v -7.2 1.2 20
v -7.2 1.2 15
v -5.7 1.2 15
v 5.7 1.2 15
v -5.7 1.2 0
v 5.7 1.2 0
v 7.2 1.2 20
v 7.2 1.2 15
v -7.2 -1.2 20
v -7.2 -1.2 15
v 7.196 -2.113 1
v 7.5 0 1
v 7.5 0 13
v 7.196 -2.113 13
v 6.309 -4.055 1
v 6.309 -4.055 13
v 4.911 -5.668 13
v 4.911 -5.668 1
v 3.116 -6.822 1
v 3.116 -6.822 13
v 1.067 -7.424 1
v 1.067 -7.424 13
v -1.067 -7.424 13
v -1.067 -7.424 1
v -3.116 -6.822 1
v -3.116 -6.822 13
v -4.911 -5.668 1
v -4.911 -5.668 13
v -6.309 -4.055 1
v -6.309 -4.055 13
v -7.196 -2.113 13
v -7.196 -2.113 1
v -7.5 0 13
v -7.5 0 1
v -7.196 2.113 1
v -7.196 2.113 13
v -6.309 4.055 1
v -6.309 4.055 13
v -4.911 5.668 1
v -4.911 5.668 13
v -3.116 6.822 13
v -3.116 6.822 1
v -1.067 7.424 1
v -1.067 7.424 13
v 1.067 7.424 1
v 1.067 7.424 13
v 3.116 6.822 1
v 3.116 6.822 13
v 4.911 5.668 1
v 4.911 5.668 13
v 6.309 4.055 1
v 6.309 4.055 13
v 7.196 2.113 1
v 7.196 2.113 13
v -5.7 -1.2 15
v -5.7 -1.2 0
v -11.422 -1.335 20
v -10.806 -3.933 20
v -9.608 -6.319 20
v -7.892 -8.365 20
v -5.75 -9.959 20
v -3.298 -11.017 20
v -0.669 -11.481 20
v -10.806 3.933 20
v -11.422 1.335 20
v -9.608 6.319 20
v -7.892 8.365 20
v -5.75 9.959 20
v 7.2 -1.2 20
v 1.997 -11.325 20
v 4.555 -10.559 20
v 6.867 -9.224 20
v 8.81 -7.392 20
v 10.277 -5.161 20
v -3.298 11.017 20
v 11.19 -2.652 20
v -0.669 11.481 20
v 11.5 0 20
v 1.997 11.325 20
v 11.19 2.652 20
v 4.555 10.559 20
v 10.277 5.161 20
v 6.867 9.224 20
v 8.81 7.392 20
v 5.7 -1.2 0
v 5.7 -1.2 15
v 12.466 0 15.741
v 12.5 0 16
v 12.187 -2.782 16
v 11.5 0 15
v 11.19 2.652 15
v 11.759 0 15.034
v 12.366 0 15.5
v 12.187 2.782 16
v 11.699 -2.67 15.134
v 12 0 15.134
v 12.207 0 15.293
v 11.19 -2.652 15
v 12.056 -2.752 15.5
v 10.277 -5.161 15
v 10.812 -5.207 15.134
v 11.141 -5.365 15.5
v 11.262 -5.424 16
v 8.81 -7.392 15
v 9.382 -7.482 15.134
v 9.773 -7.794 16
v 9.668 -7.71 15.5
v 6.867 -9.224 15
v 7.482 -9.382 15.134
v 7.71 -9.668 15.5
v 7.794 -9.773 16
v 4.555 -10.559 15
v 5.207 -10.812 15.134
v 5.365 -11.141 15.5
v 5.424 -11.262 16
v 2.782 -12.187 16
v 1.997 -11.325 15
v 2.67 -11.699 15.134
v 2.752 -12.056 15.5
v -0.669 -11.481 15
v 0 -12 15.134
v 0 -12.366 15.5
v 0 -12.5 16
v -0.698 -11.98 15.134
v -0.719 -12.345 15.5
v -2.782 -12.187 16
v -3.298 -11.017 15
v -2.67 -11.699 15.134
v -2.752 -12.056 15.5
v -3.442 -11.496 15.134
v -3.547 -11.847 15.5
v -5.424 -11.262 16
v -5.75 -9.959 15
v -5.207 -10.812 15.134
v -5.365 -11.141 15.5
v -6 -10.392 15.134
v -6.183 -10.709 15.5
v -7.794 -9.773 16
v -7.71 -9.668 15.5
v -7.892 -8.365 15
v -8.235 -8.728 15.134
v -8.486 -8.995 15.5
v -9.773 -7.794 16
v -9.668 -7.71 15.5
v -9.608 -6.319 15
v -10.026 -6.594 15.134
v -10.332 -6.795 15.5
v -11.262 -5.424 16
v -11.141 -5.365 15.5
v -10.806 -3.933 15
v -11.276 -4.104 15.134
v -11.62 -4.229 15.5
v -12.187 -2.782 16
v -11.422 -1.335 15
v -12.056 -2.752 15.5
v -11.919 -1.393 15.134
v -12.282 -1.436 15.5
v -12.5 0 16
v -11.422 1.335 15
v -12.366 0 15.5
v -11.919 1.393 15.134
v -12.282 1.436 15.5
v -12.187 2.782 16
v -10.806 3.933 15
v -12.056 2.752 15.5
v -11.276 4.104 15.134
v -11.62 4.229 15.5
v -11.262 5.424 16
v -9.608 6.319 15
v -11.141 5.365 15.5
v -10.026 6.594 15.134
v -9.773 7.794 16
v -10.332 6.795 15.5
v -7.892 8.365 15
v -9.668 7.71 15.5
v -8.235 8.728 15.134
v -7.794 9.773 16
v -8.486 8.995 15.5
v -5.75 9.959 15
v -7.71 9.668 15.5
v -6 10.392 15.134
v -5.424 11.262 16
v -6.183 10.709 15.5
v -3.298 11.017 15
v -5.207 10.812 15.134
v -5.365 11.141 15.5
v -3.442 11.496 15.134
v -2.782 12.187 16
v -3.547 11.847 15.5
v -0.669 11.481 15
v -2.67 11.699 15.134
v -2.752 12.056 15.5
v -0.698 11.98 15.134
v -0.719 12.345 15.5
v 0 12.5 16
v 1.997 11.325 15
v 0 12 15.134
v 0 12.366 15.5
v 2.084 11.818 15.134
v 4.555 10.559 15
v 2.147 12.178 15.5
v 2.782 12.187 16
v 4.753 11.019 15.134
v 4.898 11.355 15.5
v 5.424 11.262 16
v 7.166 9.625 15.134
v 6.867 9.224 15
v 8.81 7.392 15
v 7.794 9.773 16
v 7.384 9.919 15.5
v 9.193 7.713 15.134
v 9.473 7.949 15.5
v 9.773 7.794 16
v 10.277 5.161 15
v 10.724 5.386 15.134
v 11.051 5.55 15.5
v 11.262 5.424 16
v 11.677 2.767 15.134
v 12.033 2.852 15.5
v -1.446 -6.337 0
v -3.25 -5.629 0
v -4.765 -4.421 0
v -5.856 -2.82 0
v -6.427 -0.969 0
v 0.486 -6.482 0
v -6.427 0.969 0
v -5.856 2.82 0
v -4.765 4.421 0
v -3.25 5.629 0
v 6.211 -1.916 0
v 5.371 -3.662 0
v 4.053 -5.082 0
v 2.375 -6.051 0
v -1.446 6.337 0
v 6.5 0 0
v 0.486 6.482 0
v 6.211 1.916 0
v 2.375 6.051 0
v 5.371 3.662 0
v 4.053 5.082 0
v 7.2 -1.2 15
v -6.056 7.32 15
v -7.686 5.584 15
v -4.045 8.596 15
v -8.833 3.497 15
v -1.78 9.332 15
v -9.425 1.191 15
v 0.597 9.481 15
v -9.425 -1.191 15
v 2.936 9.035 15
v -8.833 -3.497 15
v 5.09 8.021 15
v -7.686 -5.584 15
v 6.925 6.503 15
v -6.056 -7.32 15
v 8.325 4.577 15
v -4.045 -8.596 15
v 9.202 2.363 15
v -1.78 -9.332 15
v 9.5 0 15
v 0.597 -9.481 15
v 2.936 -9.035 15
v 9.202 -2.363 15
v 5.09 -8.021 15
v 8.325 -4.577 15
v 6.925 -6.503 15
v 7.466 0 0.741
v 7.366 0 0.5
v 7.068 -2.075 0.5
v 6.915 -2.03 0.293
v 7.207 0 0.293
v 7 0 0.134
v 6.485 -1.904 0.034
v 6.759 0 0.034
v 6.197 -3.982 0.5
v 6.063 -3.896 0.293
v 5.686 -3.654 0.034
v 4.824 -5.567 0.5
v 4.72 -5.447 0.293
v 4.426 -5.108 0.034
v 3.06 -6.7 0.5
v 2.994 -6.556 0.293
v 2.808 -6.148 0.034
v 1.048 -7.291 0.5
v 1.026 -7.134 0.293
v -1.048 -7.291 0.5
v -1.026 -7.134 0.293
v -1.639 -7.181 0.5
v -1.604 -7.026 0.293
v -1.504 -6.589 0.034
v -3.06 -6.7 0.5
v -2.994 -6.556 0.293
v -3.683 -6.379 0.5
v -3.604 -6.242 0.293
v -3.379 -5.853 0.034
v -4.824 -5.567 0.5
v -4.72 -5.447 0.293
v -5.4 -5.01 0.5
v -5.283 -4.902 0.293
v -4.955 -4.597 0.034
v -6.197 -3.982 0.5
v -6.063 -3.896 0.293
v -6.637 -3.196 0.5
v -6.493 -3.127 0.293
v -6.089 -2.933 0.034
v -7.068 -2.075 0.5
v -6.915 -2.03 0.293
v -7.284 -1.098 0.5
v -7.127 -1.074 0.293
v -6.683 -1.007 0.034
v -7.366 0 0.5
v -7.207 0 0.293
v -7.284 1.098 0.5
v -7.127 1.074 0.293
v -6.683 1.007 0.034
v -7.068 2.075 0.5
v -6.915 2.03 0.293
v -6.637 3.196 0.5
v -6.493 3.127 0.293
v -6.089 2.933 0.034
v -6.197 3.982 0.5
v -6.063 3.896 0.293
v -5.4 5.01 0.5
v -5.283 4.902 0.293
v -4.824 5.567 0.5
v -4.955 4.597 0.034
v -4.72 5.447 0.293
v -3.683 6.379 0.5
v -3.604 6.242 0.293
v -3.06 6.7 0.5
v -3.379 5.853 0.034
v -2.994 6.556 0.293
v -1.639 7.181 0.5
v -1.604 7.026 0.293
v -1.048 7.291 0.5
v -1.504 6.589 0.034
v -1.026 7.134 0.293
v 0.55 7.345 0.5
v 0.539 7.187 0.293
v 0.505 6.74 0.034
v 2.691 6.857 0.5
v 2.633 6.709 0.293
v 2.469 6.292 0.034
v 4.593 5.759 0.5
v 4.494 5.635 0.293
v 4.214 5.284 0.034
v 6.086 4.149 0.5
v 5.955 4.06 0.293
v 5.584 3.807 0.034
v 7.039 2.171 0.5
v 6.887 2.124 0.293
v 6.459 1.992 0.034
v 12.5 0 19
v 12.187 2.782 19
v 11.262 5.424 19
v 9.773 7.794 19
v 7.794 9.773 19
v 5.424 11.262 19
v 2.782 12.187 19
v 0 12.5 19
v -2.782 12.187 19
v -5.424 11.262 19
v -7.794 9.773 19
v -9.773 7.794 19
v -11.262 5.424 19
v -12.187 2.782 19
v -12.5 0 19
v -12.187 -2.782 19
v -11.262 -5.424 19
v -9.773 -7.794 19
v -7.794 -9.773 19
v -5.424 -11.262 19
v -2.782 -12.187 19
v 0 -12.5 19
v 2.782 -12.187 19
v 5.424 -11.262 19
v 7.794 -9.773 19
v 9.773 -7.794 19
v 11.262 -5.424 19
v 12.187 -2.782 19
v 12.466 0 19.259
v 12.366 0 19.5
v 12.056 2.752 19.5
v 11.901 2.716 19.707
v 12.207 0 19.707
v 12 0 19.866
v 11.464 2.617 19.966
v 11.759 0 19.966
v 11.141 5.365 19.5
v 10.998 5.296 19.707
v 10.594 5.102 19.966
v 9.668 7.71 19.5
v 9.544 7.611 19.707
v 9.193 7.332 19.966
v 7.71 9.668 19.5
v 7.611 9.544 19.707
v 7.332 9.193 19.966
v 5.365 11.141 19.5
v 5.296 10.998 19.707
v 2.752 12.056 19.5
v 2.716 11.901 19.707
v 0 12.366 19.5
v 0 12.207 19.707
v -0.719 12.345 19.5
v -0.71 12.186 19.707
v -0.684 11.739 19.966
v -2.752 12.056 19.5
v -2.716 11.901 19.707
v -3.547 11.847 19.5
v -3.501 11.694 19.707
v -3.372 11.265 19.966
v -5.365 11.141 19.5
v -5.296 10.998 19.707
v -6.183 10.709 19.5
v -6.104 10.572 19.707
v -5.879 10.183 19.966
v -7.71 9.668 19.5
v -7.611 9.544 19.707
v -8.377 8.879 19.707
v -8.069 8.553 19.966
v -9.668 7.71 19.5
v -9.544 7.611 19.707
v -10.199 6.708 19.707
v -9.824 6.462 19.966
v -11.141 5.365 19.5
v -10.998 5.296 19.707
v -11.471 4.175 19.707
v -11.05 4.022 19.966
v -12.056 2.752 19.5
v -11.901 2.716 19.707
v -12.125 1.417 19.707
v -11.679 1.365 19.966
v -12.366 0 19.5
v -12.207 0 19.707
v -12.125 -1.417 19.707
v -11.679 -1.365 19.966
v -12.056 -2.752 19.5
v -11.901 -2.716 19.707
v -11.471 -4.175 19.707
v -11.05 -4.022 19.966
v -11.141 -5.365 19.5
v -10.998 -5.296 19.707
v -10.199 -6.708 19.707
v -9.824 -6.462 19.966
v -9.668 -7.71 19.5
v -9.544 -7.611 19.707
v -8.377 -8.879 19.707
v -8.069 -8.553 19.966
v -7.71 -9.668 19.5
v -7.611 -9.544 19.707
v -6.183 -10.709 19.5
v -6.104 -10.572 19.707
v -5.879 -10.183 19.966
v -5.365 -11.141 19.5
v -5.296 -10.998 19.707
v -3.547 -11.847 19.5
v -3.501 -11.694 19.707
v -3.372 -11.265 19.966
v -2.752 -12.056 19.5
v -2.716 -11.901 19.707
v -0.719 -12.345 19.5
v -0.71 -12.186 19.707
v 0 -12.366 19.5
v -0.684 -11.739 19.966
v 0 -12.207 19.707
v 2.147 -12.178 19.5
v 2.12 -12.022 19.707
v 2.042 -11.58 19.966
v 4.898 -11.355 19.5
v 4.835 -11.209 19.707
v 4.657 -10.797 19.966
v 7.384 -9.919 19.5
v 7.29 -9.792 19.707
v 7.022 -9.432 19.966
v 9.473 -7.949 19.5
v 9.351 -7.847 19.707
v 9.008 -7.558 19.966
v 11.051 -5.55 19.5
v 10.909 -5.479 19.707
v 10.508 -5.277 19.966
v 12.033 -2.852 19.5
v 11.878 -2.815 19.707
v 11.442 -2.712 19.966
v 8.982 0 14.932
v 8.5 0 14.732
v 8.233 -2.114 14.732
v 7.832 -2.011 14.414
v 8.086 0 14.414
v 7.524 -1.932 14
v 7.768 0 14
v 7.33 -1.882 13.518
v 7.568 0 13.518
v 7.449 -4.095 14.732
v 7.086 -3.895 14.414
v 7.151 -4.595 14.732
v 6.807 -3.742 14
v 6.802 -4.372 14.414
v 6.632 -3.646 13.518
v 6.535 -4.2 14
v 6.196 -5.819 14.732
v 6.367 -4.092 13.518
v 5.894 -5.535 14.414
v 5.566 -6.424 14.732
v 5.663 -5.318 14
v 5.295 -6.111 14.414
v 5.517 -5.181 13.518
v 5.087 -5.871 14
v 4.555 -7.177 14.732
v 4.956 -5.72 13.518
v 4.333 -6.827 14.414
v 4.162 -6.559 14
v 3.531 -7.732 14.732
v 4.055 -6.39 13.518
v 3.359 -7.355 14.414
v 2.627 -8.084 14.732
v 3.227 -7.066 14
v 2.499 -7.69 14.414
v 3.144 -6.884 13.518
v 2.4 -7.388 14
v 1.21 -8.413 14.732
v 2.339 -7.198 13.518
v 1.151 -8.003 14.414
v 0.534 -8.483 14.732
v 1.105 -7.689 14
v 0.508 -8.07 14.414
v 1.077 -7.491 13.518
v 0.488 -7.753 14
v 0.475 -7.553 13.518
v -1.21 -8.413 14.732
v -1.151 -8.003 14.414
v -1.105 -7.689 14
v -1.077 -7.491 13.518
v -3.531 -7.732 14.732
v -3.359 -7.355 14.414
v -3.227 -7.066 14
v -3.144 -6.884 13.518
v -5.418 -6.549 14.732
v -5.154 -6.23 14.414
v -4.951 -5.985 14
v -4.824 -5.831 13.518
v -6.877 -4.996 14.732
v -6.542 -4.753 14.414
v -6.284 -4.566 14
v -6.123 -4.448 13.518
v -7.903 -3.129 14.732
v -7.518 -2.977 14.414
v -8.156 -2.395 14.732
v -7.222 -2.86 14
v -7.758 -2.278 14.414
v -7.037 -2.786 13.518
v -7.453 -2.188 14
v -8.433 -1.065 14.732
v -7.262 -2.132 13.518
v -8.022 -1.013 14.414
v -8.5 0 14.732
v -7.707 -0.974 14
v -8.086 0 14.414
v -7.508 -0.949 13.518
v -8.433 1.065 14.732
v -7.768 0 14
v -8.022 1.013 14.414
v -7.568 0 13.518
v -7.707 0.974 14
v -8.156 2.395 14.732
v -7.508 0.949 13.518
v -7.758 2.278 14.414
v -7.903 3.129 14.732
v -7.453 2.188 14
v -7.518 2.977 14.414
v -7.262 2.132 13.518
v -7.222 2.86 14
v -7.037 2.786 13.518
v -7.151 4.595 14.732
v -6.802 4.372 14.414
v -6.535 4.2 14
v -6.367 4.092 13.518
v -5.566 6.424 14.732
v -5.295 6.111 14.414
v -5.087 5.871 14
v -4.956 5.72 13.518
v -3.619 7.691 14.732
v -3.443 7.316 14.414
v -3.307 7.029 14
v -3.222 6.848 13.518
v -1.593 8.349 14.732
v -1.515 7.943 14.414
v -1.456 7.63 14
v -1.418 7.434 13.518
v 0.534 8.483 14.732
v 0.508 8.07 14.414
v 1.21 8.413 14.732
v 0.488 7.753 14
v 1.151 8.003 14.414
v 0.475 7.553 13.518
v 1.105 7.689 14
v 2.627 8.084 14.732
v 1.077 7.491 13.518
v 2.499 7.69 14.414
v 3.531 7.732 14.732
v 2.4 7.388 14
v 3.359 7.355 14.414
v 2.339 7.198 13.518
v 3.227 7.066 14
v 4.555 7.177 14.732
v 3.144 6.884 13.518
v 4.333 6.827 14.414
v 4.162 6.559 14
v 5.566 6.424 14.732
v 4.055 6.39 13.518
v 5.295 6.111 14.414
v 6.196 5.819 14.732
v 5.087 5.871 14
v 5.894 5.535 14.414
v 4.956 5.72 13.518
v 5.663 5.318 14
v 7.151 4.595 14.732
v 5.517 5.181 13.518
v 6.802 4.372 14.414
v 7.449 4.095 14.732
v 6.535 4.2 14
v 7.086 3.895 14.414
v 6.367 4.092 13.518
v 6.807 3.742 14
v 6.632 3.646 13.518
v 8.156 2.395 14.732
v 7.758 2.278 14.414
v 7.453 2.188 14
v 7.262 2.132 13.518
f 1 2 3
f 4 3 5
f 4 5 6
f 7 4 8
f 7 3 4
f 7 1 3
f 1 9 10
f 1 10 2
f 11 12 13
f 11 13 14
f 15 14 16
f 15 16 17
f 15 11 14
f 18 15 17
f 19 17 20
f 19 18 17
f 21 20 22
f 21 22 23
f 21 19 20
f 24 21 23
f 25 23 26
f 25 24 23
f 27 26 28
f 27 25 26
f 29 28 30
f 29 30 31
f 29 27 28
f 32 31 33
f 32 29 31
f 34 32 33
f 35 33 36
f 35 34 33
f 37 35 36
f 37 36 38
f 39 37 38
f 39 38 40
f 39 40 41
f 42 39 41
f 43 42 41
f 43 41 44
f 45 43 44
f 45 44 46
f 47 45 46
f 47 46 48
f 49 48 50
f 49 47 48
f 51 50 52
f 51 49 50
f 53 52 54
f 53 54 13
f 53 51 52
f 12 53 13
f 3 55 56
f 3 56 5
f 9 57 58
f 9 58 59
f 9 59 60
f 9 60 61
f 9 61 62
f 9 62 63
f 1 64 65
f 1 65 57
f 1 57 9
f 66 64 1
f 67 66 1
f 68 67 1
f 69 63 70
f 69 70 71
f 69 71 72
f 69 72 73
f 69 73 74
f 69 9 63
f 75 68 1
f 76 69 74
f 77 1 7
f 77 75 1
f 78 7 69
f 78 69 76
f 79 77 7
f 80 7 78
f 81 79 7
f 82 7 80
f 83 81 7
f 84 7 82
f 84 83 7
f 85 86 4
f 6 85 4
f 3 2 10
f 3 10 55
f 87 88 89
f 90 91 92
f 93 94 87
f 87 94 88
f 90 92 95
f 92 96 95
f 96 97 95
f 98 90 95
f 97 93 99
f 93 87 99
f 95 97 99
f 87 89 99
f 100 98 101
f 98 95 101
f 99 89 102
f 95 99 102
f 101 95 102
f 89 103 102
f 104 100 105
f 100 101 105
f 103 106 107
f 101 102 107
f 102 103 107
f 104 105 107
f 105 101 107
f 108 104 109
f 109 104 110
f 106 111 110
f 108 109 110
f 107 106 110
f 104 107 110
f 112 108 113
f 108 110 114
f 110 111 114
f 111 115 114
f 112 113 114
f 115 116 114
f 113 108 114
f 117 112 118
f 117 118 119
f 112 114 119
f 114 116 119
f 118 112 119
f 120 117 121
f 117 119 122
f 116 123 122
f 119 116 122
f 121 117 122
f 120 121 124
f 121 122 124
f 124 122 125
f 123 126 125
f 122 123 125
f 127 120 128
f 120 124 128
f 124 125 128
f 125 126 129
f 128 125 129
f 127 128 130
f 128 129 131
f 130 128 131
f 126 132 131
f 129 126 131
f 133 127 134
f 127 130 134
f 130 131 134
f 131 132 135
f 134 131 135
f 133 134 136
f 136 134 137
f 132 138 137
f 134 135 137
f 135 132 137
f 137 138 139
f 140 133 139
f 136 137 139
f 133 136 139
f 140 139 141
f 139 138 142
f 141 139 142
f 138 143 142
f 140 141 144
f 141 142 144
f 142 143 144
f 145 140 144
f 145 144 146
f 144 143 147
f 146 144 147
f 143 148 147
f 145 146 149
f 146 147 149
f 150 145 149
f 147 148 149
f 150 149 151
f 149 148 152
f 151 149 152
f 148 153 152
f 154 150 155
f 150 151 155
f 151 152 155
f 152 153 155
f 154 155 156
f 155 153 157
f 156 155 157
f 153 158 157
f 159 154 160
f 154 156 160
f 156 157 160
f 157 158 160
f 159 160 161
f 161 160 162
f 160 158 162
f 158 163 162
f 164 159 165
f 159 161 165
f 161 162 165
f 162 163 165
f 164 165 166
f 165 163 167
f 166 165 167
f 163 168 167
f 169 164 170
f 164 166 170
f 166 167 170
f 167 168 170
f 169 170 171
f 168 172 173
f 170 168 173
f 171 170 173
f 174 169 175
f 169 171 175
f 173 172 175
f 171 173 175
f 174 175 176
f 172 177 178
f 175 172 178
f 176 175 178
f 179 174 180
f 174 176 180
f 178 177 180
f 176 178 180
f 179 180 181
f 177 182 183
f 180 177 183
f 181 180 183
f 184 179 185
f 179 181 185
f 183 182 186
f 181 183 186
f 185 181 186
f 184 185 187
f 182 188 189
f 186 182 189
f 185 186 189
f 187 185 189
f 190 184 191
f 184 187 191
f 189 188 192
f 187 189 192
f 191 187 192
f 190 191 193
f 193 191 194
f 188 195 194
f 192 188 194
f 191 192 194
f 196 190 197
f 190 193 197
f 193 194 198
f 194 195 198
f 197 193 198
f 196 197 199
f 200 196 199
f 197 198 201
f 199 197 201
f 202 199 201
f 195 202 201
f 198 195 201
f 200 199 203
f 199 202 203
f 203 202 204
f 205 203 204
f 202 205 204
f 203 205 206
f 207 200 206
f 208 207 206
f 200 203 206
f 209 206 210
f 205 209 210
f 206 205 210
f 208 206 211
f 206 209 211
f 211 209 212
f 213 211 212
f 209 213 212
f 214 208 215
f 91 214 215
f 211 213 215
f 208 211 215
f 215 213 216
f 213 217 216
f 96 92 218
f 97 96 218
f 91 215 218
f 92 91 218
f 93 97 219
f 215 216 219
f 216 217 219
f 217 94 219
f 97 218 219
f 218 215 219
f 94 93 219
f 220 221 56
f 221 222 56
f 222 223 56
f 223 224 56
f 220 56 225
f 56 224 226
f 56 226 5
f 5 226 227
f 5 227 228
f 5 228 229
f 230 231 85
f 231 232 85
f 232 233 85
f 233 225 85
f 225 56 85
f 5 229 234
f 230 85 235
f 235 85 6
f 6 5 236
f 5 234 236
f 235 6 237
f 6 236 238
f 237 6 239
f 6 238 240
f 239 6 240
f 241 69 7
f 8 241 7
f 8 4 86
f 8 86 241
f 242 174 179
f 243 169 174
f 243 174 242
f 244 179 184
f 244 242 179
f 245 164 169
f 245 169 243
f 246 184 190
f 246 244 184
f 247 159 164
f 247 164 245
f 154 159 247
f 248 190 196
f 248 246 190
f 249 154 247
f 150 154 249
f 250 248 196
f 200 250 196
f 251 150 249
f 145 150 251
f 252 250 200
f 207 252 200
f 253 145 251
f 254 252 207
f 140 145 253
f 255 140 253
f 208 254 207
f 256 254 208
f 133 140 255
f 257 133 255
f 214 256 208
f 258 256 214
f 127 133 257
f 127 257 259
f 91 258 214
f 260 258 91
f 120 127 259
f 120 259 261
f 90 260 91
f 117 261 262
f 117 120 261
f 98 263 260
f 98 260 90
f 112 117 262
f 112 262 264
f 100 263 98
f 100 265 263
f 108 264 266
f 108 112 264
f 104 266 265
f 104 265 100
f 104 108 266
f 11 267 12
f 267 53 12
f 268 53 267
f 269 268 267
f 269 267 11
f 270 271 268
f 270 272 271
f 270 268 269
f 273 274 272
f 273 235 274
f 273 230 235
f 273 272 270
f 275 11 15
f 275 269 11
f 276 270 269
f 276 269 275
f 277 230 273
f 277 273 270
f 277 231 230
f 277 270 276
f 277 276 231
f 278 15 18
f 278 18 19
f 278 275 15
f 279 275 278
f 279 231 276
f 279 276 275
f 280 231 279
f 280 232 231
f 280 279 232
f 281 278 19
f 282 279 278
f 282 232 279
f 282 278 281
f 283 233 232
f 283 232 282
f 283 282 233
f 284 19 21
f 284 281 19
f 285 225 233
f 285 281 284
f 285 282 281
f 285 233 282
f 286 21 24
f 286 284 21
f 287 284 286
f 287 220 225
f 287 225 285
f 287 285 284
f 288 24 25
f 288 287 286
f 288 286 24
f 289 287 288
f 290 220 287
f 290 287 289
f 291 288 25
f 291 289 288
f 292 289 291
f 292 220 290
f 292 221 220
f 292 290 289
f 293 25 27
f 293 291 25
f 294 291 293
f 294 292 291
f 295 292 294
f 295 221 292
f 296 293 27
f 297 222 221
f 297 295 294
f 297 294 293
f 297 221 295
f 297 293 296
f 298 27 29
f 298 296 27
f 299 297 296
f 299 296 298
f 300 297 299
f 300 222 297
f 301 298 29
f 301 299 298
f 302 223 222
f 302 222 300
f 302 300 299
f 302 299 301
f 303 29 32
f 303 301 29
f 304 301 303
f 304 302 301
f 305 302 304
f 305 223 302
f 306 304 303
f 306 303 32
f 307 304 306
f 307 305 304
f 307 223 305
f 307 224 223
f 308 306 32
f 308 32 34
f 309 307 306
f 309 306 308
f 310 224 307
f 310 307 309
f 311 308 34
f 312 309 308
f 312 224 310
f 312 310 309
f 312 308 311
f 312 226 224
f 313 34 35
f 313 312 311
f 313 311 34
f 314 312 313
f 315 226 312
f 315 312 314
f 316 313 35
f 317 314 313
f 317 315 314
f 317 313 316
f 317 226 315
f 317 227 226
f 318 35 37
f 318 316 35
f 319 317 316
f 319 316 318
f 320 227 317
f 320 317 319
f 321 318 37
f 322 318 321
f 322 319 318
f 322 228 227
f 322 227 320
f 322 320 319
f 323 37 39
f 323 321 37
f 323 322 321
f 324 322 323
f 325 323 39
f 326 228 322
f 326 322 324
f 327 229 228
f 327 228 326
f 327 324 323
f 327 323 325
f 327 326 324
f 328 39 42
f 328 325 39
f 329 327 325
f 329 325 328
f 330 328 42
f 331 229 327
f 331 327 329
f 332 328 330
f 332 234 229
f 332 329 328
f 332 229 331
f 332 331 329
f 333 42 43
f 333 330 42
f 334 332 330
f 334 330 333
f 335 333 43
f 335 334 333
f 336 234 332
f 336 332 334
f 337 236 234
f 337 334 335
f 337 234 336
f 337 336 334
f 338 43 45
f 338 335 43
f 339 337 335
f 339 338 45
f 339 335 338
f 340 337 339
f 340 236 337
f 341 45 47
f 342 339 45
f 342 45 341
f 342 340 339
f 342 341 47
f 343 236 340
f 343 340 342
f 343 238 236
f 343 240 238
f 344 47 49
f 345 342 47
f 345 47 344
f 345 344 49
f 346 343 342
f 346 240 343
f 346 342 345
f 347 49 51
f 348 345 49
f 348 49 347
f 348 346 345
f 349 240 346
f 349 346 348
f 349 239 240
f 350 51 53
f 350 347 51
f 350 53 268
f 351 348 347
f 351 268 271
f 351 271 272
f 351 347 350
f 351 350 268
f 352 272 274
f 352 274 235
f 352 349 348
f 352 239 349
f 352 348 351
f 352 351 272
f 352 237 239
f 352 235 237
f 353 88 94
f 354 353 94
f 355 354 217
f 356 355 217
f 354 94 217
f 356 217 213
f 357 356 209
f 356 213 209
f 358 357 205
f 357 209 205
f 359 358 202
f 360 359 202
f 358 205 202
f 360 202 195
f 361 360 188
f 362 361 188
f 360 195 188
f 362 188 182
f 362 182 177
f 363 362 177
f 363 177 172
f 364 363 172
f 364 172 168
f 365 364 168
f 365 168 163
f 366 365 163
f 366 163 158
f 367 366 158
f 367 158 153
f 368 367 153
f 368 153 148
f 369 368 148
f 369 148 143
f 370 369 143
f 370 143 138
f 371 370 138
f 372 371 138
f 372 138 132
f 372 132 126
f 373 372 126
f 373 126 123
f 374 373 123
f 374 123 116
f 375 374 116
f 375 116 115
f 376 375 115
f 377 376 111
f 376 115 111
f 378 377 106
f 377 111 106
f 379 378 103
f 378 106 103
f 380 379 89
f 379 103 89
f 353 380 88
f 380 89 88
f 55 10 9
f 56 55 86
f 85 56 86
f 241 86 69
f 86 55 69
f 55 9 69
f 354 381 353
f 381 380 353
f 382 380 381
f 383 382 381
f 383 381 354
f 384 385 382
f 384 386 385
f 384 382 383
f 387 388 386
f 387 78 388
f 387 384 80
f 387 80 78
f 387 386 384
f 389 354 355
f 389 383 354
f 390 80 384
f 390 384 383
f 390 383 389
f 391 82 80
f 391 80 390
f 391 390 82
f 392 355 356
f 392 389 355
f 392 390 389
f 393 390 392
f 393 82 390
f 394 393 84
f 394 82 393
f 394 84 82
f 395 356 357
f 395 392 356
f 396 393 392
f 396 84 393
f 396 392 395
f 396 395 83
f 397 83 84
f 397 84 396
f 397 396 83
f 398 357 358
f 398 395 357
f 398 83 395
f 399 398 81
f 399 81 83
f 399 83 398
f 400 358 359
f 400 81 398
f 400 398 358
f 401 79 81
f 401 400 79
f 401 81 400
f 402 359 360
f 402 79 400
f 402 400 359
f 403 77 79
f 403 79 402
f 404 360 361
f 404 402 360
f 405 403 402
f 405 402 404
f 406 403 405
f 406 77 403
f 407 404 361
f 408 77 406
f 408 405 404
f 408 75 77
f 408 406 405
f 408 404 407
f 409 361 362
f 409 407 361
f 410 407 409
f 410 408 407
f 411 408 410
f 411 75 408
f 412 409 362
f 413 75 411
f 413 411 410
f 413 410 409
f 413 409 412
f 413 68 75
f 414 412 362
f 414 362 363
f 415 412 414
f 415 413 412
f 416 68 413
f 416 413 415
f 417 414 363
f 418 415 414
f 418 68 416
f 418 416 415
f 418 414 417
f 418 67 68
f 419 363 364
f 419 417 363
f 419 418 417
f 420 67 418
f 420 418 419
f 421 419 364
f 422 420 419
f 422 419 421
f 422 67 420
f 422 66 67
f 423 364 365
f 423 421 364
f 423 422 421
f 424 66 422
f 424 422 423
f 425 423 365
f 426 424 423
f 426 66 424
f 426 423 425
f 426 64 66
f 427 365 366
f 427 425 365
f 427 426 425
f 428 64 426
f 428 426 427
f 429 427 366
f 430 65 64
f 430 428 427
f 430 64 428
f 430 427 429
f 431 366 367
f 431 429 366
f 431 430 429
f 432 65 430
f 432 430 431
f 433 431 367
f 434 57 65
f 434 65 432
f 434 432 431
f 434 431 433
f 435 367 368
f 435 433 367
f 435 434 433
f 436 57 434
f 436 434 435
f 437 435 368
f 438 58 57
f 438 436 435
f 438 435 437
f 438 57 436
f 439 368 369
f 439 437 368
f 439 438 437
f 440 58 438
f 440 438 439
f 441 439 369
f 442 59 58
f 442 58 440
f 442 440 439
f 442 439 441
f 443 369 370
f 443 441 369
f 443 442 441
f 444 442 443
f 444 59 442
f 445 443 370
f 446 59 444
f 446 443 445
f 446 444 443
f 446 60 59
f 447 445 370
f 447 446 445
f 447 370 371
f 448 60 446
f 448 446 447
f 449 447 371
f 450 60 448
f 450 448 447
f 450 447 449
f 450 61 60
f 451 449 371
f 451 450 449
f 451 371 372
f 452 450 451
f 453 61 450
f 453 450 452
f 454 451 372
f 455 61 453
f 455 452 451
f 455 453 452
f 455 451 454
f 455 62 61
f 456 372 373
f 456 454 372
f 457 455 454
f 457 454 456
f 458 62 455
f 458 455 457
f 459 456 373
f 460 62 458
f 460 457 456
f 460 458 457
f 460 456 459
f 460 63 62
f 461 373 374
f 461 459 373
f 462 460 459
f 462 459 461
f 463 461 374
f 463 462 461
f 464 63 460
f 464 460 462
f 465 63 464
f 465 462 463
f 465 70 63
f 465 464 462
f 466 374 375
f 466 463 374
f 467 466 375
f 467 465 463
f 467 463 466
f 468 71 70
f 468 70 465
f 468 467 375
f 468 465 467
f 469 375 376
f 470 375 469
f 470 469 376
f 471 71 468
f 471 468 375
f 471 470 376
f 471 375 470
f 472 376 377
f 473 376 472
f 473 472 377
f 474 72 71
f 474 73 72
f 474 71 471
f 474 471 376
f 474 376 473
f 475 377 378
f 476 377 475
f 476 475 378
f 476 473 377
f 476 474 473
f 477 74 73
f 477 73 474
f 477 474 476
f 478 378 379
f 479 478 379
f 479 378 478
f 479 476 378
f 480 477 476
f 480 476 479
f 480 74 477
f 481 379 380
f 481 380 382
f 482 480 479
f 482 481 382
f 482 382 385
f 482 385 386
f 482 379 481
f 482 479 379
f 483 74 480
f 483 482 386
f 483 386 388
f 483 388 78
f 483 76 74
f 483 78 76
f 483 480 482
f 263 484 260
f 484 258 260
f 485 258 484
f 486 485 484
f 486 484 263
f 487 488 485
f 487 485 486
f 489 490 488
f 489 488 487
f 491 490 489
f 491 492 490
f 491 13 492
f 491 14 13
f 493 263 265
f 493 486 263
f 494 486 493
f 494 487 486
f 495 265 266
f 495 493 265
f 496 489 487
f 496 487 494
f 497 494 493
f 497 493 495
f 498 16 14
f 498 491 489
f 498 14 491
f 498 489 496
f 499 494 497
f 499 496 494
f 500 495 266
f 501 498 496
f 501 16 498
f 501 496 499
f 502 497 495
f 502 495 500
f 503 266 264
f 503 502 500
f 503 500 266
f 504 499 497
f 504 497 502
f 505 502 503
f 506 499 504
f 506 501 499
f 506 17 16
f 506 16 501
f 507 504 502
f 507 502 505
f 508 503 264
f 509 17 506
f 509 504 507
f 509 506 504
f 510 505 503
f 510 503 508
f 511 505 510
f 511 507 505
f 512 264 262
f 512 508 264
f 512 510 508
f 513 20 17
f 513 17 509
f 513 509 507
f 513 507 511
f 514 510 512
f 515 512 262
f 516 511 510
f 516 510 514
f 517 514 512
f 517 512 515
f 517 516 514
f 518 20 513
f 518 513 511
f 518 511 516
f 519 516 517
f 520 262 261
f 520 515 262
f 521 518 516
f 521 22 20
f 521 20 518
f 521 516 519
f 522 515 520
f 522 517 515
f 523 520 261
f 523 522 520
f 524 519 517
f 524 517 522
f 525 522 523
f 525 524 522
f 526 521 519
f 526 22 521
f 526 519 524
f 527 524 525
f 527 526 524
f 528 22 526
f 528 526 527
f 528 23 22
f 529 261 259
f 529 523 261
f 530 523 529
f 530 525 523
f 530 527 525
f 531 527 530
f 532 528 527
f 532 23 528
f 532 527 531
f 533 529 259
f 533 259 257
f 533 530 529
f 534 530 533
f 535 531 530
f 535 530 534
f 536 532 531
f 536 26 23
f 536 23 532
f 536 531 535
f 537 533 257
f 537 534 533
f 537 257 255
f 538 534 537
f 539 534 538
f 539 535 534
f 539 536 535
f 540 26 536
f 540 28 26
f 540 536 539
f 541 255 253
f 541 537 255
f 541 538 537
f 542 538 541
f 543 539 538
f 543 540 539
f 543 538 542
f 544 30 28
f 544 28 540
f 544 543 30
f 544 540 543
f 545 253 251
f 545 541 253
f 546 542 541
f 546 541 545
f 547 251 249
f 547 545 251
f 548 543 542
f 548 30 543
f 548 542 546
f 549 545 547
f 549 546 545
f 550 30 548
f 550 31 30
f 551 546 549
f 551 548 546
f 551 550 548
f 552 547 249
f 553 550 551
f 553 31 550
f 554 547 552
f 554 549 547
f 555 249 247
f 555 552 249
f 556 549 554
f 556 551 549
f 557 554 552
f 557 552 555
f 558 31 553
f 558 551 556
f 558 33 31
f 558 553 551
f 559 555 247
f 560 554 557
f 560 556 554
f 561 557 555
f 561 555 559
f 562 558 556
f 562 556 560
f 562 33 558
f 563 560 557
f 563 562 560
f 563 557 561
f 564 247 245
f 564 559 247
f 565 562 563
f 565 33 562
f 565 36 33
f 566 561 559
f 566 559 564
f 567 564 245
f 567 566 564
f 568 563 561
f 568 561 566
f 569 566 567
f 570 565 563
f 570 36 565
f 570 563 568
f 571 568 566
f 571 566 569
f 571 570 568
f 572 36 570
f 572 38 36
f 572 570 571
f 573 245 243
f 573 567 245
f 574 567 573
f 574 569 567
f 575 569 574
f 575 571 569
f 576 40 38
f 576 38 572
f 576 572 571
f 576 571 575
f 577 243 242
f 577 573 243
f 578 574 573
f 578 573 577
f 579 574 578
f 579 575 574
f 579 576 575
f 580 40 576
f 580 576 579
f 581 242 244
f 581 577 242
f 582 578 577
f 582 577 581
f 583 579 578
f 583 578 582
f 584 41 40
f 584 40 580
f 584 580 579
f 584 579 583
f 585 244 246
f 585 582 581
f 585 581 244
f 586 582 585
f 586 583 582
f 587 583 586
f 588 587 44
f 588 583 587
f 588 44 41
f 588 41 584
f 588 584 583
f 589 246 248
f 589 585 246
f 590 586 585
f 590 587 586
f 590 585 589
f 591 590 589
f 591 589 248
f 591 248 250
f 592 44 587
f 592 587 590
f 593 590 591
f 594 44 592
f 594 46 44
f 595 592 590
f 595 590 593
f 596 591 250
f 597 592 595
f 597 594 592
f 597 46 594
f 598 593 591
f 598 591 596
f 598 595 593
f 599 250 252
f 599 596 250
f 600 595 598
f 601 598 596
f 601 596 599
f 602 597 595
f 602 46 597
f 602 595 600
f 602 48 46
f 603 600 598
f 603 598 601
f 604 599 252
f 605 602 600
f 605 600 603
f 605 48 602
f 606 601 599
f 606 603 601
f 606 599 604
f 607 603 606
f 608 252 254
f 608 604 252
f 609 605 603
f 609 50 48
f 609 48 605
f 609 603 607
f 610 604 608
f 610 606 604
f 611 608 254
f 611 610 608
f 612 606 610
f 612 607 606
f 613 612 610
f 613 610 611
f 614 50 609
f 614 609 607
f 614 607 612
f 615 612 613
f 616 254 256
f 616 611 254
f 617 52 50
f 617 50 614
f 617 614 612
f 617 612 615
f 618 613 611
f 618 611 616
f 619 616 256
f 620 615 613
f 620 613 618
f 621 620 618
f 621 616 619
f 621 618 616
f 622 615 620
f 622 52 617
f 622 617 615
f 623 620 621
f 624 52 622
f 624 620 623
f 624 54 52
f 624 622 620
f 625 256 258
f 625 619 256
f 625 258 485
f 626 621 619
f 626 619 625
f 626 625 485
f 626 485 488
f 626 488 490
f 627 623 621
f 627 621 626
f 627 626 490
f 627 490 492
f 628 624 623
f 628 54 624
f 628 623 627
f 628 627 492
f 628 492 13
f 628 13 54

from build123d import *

# Parameters (mm, degrees)
F0_R     = 12.5
F1_DEPTH = 20
F2_W     = 14.4
F2_H     = 2.4
F3_DEPTH = 5
F4_R     = 12.5
F4_R_2   = 7.5
F5_DEPTH = 15
F6_W     = 11.4
F6_H     = 2.4
F7_DEPTH = 15.001
F8_R     = 2
F9_R     = 1


with BuildPart() as f1:
    # F0 (on Top) → F1 (new body)
    with BuildSketch(Plane.XY):
        Circle(F0_R)
    extrude(amount=F1_DEPTH)

    # F2 (on face) → F3 (cut)
    with BuildSketch(Plane.XY.offset(20)):
        Rectangle(F2_W, F2_H)
    extrude(amount=-F3_DEPTH, mode=Mode.SUBTRACT)

    # F4 (on face) → F5 (cut)
    with BuildSketch(Plane(origin=(0, 0, 0), x_dir=(1, 0, 0), z_dir=(0, 0, -1))):
        Circle(F4_R)
        Circle(F4_R_2, mode=Mode.SUBTRACT)
    extrude(amount=-F5_DEPTH, mode=Mode.SUBTRACT)

    # F6 (on face) → F7 (cut, through all)
    with BuildSketch(Plane.XY.offset(15)):
        Rectangle(F6_W, F6_H)
    extrude(amount=-F7_DEPTH, mode=Mode.SUBTRACT)

    # F8
    f8_edges = [f1.edges().sort_by_distance(p)[0] for p in [
        (-7.5, 0, 15),
    ]]
    fillet(f8_edges, radius=F8_R)

    # F9
    f9_edges = [f1.edges().sort_by_distance(p)[0] for p in [
        (-12.5, 0, 20),
        (-12.5, 0, 15),
        (-7.5, 0, 0),
    ]]
    fillet(f9_edges, radius=F9_R)


solid = f1.part
